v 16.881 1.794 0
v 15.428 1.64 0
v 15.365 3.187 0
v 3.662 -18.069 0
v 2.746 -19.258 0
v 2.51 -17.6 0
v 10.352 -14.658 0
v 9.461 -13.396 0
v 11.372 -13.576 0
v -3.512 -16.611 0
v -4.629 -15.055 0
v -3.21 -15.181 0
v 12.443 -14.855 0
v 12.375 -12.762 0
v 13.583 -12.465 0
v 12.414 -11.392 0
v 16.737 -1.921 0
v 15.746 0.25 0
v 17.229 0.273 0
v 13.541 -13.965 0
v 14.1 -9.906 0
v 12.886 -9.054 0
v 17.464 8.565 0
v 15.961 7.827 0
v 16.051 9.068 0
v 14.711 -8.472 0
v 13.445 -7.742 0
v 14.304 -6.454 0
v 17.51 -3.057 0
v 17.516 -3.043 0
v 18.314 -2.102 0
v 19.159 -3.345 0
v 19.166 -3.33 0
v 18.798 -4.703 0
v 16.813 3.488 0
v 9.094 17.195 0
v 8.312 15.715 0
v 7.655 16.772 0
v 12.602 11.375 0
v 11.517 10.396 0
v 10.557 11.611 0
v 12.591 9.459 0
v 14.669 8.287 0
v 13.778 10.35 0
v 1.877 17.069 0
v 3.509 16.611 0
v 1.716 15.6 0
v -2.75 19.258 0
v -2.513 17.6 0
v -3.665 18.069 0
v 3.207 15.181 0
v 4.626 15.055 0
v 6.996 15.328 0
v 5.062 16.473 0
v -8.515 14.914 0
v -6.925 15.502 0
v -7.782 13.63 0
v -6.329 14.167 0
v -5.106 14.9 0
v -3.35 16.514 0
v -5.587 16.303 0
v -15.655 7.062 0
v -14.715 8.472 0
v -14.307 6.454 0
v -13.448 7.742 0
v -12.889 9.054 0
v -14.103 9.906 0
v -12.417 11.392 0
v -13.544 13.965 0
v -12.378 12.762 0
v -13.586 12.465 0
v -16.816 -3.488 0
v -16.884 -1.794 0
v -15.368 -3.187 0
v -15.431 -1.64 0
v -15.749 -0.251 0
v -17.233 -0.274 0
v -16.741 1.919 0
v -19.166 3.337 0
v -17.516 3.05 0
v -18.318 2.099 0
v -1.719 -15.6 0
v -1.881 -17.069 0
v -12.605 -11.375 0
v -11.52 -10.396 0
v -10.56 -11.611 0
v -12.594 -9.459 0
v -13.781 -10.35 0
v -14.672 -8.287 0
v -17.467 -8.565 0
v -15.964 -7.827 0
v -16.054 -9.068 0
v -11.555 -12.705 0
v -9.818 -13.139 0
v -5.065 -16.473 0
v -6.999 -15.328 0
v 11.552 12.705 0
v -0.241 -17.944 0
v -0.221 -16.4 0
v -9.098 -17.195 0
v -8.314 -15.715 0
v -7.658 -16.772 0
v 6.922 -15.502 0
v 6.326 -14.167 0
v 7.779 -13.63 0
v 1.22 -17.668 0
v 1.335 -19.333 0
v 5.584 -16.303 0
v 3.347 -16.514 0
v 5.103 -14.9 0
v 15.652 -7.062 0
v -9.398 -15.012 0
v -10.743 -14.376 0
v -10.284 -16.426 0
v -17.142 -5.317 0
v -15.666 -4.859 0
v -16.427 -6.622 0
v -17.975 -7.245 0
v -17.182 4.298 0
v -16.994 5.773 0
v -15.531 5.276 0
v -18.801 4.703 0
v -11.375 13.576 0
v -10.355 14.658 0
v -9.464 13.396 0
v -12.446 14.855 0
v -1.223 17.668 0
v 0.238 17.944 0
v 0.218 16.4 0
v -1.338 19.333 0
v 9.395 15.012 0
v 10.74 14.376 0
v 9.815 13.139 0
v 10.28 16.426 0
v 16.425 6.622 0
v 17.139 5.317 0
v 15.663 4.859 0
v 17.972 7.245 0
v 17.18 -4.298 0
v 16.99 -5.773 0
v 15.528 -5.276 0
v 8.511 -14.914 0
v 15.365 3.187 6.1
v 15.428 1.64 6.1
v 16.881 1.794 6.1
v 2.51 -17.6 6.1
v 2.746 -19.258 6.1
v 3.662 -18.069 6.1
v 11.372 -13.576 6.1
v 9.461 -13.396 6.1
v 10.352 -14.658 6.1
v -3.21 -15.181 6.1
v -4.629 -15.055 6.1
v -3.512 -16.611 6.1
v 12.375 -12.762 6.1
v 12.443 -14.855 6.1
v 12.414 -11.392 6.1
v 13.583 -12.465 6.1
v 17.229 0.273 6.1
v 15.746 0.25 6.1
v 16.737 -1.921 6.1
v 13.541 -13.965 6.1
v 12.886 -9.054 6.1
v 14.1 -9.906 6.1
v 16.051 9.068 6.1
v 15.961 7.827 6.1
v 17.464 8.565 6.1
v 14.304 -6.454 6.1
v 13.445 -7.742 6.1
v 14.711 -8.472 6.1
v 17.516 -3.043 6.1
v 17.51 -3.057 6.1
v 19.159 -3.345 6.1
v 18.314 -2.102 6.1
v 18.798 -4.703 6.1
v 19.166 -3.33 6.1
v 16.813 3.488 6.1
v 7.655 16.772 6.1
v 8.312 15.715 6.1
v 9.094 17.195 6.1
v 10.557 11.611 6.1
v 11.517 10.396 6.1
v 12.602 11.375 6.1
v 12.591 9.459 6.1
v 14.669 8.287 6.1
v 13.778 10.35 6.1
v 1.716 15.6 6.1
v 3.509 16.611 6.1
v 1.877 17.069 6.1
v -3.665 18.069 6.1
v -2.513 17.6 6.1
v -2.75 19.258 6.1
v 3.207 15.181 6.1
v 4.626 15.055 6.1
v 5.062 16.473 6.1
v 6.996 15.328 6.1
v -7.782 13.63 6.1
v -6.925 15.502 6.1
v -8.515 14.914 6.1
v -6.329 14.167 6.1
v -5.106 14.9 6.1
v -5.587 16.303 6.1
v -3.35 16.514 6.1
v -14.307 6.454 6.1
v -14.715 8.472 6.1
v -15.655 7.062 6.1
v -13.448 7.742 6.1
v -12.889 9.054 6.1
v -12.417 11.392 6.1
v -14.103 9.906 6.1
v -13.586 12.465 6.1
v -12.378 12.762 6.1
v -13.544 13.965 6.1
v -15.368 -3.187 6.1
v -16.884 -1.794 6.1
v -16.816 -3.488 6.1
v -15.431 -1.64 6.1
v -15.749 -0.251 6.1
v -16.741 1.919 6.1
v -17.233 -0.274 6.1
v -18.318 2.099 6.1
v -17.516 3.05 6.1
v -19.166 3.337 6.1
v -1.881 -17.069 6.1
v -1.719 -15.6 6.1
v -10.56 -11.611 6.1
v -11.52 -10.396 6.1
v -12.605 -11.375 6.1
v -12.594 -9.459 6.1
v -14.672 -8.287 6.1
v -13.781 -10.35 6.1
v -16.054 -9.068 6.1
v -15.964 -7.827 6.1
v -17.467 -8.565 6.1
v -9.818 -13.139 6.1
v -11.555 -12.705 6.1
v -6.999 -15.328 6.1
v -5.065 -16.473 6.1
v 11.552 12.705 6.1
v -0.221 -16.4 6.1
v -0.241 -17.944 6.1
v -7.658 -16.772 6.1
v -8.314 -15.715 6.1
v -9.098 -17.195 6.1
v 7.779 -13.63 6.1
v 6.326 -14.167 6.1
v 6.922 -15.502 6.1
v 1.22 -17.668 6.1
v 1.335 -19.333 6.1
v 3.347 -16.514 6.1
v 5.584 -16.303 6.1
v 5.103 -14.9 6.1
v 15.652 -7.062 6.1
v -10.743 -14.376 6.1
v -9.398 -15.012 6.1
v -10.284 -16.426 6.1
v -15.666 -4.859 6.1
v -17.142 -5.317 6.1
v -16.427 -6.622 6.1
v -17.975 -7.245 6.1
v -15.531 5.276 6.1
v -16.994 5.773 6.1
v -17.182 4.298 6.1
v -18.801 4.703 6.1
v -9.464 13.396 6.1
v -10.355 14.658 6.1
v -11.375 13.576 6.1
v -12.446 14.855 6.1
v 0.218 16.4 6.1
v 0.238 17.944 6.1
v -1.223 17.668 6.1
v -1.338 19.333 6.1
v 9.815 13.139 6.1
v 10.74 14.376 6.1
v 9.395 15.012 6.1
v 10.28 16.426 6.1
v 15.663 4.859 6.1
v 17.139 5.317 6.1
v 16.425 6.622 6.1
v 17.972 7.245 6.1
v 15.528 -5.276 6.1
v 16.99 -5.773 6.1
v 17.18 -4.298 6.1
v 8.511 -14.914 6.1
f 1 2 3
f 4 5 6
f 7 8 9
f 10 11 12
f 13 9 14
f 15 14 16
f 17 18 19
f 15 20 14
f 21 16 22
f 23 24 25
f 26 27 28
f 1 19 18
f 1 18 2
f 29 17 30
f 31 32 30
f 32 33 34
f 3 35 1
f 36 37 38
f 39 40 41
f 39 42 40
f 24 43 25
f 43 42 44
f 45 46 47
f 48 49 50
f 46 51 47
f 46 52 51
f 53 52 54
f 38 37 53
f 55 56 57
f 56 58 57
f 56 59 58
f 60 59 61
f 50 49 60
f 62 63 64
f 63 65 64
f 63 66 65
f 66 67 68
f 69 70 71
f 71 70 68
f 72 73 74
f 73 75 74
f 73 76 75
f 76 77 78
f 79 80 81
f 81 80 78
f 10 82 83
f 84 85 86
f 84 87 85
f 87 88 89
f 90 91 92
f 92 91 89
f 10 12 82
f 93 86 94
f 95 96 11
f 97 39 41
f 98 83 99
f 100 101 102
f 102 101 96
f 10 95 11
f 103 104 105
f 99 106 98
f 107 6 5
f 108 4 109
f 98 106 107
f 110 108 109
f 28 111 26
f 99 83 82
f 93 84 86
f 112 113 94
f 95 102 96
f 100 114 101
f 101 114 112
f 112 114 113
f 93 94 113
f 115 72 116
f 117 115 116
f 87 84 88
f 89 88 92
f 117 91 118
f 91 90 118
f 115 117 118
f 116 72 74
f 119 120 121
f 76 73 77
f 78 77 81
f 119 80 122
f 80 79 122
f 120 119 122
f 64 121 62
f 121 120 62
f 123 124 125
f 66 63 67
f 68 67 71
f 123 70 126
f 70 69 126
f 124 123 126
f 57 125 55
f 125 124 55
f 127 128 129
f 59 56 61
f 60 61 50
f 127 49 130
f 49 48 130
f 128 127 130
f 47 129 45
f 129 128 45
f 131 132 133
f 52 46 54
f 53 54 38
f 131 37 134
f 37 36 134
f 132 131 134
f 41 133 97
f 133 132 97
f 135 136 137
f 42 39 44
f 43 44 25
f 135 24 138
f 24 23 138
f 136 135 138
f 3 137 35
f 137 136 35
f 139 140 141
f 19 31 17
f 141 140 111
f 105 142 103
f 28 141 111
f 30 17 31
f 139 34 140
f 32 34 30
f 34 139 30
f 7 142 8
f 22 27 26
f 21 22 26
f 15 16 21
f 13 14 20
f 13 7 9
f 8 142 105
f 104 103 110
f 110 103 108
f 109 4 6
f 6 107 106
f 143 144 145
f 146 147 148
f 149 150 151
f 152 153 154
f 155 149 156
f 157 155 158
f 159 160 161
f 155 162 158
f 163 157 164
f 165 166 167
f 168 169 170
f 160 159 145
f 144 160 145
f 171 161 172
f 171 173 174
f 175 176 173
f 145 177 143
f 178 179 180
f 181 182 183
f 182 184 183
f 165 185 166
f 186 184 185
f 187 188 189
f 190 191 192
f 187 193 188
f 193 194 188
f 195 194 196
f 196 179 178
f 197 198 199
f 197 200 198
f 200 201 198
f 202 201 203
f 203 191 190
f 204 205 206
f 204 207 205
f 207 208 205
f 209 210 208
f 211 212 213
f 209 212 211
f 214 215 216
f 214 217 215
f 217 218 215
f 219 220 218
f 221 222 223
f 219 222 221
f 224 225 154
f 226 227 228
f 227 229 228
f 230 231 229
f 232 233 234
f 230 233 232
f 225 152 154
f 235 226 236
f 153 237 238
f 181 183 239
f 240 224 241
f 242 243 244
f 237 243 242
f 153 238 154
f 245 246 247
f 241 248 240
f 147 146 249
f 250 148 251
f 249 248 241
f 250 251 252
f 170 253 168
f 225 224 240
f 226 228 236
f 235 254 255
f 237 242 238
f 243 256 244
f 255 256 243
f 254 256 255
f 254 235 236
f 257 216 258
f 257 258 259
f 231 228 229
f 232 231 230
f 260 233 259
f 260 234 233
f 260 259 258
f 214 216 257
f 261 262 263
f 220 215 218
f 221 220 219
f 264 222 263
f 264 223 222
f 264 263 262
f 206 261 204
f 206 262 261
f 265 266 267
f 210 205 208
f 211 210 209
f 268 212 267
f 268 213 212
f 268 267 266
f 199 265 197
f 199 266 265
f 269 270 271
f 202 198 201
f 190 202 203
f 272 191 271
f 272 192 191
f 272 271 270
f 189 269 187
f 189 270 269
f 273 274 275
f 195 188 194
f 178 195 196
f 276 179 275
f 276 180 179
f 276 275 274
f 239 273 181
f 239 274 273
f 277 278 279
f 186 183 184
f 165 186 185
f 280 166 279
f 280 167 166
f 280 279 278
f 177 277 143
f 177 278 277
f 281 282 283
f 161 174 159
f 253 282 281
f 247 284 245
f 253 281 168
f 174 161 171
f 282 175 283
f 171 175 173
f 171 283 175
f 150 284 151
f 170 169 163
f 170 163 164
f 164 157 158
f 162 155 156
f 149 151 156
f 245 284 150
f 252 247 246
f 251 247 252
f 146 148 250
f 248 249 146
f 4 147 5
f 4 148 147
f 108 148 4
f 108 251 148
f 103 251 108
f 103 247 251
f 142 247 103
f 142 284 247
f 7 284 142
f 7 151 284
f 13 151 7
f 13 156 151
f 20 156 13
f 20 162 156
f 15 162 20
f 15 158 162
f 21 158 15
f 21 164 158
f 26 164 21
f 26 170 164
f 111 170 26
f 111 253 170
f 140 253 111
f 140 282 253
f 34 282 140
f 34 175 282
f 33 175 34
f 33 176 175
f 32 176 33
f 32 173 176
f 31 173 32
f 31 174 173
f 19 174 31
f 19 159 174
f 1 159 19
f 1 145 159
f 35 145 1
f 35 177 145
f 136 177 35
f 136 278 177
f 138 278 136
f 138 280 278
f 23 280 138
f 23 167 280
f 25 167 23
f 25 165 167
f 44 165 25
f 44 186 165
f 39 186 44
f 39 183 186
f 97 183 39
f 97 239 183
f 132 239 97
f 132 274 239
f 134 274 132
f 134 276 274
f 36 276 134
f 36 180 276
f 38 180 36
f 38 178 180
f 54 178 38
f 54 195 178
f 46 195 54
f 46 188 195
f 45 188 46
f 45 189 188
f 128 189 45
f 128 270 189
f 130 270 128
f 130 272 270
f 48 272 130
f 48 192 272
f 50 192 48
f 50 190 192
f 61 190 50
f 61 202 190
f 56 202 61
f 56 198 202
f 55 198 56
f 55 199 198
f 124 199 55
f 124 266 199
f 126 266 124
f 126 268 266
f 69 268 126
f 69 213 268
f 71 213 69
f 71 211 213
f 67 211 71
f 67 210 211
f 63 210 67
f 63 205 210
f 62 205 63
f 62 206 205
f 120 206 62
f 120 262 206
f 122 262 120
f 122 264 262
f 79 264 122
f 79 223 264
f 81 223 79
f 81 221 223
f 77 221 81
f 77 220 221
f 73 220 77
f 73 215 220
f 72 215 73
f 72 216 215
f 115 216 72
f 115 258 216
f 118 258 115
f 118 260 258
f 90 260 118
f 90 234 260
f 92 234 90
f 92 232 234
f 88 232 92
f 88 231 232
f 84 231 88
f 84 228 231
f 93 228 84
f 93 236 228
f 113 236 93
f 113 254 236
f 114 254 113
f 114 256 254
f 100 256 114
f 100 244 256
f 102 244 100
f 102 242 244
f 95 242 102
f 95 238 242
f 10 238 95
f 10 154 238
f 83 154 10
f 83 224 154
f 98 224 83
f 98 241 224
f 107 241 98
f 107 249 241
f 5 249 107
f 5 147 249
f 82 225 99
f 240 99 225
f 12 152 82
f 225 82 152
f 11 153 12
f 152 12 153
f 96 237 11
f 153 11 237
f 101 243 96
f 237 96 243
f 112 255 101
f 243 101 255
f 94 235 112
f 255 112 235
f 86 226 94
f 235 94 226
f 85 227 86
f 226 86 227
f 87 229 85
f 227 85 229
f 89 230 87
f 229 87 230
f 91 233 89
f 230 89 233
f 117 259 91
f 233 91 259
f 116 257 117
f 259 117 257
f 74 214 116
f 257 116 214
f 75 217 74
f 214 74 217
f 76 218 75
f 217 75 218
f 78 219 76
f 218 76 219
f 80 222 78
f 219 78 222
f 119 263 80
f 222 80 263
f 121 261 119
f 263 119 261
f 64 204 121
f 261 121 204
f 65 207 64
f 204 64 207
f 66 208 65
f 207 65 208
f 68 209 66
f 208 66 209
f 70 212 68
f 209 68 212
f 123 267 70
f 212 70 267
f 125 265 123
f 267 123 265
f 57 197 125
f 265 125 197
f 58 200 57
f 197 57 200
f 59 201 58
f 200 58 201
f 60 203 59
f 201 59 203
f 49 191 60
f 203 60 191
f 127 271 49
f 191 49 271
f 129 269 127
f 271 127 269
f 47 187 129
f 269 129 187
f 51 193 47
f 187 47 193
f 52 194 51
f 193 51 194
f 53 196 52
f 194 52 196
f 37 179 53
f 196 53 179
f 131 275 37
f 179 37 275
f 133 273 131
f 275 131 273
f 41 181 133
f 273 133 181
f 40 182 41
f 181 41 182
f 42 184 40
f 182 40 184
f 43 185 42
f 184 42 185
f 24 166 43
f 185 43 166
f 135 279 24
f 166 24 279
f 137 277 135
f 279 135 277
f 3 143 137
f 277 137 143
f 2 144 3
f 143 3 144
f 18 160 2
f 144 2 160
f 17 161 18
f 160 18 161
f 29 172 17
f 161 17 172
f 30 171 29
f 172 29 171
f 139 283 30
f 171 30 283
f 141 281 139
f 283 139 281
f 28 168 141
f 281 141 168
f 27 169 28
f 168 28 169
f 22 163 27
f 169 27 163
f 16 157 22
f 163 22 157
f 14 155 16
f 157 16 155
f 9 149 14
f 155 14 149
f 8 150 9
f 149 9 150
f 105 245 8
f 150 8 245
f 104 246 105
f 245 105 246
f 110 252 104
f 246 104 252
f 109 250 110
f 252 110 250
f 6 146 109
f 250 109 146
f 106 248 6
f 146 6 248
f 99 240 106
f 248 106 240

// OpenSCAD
width_lock = 0.750000000;

thickness = 1.75;
tolerance = 0.2;
height = 6.1;

center_lock_1 = [765.762441146,610.914145729];
size_lock_1 = [34.631762292,34.933122708];
stroke_width_lock_1 = 0.065400989;
// paths for lock_1
points_lock_1_1 = [ [-16.239926562,-6.545937187],[-15.487242945,-4.803716399],[-15.192888870,-3.151026270],[-15.254439274,-1.621254529],[-15.569469089,-0.247788906],[-16.550266689,1.896673066],[-17.315881146,3.015257813],[-16.986263229,4.248983438],[-15.353284713,5.216057225],[-14.143727484,6.380096354],[-13.294352300,7.653886304],[-12.741919922,8.950212552],[-12.274926618,11.261615859],[-12.236833646,12.616590104],[-11.245016562,13.420923438],[-9.355474430,13.243464502],[-7.692714115,13.474233672],[-6.256837314,14.005501709],[-5.047945729,14.729539375],[-3.311525000,16.325006641],[-2.484265521,17.398801563],[-1.209079687,17.466561354],[0.215279314,16.212352070],[1.696120140,15.421703018],[3.170038597,15.007520288],[4.573630495,14.882709974],[6.916217842,15.152830954],[8.216648646,15.535314688],[9.288105312,14.840598229],[9.703234547,12.988701913],[10.436531338,11.478634964],[11.385507987,10.277204681],[12.447676797,9.351218359],[14.501640107,8.192806794],[15.778519687,7.737858646],[16.237016146,6.546043021],[15.484335525,4.803808693],[15.189947861,3.151023789],[15.251393982,1.620994803],[15.566214714,0.247028229],[16.546143324,-1.899491706],[17.310060313,-3.022084062],[17.315881146,-3.008325729],[16.983352812,-4.248983437],[15.350373160,-5.216057225],[14.140812933,-6.380096354],[13.291433512,-7.653886304],[12.738996276,-8.950212552],[12.271993877,-11.261615859],[12.233896771,-12.616590104],[11.242079687,-13.420923437],[9.352545203,-13.243464502],[7.689788815,-13.474233672],[6.253913462,-14.005501709],[5.045022083,-14.729539375],[3.308603008,-16.325006641],[2.481355104,-17.398801562],[1.206169271,-17.466561354],[-0.218189731,-16.212352070],[-1.699030557,-15.421703018],[-3.172949014,-15.007520288],[-4.576540911,-14.882709974],[-6.919128258,-15.152830954],[-8.219559063,-15.535314687],[-9.291042188,-14.840598229],[-9.706162740,-12.988701913],[-10.439453330,-11.478634964],[-11.388426259,-10.277204681],[-12.450593828,-9.351218359],[-14.504562100,-8.192806794],[-15.781456563,-7.737858646],[-16.239926562,-6.545937187] ];
points_lock_1_2 = [ [9.288131771,14.840598229],[9.703255631,12.988687598],[10.436569372,11.478520449],[11.385605139,10.276818193],[12.447895078,9.350302240],[14.502366058,8.189714889],[15.780239479,7.730529688],[14.502366058,8.189714889],[12.447895078,9.350302240],[11.385605139,10.276818193],[10.436569372,11.478520449],[9.703255631,12.988687598],[9.288131771,14.840598229],[8.210960104,15.540235938],[9.288131771,14.840598229] ];

module polygon_lock_1() {
 render(convexity=4) {
    difference() {
      polygon(points=points_lock_1_1);
      polygon(points=points_lock_1_2);
    }
 }
}

w = size_lock_1[0];
linear_extrude(height=height)
difference() {
    scale((w+tolerance+thickness*2)/w) polygon_lock_1();
    scale((w+tolerance*2)/w) polygon_lock_1();
}
